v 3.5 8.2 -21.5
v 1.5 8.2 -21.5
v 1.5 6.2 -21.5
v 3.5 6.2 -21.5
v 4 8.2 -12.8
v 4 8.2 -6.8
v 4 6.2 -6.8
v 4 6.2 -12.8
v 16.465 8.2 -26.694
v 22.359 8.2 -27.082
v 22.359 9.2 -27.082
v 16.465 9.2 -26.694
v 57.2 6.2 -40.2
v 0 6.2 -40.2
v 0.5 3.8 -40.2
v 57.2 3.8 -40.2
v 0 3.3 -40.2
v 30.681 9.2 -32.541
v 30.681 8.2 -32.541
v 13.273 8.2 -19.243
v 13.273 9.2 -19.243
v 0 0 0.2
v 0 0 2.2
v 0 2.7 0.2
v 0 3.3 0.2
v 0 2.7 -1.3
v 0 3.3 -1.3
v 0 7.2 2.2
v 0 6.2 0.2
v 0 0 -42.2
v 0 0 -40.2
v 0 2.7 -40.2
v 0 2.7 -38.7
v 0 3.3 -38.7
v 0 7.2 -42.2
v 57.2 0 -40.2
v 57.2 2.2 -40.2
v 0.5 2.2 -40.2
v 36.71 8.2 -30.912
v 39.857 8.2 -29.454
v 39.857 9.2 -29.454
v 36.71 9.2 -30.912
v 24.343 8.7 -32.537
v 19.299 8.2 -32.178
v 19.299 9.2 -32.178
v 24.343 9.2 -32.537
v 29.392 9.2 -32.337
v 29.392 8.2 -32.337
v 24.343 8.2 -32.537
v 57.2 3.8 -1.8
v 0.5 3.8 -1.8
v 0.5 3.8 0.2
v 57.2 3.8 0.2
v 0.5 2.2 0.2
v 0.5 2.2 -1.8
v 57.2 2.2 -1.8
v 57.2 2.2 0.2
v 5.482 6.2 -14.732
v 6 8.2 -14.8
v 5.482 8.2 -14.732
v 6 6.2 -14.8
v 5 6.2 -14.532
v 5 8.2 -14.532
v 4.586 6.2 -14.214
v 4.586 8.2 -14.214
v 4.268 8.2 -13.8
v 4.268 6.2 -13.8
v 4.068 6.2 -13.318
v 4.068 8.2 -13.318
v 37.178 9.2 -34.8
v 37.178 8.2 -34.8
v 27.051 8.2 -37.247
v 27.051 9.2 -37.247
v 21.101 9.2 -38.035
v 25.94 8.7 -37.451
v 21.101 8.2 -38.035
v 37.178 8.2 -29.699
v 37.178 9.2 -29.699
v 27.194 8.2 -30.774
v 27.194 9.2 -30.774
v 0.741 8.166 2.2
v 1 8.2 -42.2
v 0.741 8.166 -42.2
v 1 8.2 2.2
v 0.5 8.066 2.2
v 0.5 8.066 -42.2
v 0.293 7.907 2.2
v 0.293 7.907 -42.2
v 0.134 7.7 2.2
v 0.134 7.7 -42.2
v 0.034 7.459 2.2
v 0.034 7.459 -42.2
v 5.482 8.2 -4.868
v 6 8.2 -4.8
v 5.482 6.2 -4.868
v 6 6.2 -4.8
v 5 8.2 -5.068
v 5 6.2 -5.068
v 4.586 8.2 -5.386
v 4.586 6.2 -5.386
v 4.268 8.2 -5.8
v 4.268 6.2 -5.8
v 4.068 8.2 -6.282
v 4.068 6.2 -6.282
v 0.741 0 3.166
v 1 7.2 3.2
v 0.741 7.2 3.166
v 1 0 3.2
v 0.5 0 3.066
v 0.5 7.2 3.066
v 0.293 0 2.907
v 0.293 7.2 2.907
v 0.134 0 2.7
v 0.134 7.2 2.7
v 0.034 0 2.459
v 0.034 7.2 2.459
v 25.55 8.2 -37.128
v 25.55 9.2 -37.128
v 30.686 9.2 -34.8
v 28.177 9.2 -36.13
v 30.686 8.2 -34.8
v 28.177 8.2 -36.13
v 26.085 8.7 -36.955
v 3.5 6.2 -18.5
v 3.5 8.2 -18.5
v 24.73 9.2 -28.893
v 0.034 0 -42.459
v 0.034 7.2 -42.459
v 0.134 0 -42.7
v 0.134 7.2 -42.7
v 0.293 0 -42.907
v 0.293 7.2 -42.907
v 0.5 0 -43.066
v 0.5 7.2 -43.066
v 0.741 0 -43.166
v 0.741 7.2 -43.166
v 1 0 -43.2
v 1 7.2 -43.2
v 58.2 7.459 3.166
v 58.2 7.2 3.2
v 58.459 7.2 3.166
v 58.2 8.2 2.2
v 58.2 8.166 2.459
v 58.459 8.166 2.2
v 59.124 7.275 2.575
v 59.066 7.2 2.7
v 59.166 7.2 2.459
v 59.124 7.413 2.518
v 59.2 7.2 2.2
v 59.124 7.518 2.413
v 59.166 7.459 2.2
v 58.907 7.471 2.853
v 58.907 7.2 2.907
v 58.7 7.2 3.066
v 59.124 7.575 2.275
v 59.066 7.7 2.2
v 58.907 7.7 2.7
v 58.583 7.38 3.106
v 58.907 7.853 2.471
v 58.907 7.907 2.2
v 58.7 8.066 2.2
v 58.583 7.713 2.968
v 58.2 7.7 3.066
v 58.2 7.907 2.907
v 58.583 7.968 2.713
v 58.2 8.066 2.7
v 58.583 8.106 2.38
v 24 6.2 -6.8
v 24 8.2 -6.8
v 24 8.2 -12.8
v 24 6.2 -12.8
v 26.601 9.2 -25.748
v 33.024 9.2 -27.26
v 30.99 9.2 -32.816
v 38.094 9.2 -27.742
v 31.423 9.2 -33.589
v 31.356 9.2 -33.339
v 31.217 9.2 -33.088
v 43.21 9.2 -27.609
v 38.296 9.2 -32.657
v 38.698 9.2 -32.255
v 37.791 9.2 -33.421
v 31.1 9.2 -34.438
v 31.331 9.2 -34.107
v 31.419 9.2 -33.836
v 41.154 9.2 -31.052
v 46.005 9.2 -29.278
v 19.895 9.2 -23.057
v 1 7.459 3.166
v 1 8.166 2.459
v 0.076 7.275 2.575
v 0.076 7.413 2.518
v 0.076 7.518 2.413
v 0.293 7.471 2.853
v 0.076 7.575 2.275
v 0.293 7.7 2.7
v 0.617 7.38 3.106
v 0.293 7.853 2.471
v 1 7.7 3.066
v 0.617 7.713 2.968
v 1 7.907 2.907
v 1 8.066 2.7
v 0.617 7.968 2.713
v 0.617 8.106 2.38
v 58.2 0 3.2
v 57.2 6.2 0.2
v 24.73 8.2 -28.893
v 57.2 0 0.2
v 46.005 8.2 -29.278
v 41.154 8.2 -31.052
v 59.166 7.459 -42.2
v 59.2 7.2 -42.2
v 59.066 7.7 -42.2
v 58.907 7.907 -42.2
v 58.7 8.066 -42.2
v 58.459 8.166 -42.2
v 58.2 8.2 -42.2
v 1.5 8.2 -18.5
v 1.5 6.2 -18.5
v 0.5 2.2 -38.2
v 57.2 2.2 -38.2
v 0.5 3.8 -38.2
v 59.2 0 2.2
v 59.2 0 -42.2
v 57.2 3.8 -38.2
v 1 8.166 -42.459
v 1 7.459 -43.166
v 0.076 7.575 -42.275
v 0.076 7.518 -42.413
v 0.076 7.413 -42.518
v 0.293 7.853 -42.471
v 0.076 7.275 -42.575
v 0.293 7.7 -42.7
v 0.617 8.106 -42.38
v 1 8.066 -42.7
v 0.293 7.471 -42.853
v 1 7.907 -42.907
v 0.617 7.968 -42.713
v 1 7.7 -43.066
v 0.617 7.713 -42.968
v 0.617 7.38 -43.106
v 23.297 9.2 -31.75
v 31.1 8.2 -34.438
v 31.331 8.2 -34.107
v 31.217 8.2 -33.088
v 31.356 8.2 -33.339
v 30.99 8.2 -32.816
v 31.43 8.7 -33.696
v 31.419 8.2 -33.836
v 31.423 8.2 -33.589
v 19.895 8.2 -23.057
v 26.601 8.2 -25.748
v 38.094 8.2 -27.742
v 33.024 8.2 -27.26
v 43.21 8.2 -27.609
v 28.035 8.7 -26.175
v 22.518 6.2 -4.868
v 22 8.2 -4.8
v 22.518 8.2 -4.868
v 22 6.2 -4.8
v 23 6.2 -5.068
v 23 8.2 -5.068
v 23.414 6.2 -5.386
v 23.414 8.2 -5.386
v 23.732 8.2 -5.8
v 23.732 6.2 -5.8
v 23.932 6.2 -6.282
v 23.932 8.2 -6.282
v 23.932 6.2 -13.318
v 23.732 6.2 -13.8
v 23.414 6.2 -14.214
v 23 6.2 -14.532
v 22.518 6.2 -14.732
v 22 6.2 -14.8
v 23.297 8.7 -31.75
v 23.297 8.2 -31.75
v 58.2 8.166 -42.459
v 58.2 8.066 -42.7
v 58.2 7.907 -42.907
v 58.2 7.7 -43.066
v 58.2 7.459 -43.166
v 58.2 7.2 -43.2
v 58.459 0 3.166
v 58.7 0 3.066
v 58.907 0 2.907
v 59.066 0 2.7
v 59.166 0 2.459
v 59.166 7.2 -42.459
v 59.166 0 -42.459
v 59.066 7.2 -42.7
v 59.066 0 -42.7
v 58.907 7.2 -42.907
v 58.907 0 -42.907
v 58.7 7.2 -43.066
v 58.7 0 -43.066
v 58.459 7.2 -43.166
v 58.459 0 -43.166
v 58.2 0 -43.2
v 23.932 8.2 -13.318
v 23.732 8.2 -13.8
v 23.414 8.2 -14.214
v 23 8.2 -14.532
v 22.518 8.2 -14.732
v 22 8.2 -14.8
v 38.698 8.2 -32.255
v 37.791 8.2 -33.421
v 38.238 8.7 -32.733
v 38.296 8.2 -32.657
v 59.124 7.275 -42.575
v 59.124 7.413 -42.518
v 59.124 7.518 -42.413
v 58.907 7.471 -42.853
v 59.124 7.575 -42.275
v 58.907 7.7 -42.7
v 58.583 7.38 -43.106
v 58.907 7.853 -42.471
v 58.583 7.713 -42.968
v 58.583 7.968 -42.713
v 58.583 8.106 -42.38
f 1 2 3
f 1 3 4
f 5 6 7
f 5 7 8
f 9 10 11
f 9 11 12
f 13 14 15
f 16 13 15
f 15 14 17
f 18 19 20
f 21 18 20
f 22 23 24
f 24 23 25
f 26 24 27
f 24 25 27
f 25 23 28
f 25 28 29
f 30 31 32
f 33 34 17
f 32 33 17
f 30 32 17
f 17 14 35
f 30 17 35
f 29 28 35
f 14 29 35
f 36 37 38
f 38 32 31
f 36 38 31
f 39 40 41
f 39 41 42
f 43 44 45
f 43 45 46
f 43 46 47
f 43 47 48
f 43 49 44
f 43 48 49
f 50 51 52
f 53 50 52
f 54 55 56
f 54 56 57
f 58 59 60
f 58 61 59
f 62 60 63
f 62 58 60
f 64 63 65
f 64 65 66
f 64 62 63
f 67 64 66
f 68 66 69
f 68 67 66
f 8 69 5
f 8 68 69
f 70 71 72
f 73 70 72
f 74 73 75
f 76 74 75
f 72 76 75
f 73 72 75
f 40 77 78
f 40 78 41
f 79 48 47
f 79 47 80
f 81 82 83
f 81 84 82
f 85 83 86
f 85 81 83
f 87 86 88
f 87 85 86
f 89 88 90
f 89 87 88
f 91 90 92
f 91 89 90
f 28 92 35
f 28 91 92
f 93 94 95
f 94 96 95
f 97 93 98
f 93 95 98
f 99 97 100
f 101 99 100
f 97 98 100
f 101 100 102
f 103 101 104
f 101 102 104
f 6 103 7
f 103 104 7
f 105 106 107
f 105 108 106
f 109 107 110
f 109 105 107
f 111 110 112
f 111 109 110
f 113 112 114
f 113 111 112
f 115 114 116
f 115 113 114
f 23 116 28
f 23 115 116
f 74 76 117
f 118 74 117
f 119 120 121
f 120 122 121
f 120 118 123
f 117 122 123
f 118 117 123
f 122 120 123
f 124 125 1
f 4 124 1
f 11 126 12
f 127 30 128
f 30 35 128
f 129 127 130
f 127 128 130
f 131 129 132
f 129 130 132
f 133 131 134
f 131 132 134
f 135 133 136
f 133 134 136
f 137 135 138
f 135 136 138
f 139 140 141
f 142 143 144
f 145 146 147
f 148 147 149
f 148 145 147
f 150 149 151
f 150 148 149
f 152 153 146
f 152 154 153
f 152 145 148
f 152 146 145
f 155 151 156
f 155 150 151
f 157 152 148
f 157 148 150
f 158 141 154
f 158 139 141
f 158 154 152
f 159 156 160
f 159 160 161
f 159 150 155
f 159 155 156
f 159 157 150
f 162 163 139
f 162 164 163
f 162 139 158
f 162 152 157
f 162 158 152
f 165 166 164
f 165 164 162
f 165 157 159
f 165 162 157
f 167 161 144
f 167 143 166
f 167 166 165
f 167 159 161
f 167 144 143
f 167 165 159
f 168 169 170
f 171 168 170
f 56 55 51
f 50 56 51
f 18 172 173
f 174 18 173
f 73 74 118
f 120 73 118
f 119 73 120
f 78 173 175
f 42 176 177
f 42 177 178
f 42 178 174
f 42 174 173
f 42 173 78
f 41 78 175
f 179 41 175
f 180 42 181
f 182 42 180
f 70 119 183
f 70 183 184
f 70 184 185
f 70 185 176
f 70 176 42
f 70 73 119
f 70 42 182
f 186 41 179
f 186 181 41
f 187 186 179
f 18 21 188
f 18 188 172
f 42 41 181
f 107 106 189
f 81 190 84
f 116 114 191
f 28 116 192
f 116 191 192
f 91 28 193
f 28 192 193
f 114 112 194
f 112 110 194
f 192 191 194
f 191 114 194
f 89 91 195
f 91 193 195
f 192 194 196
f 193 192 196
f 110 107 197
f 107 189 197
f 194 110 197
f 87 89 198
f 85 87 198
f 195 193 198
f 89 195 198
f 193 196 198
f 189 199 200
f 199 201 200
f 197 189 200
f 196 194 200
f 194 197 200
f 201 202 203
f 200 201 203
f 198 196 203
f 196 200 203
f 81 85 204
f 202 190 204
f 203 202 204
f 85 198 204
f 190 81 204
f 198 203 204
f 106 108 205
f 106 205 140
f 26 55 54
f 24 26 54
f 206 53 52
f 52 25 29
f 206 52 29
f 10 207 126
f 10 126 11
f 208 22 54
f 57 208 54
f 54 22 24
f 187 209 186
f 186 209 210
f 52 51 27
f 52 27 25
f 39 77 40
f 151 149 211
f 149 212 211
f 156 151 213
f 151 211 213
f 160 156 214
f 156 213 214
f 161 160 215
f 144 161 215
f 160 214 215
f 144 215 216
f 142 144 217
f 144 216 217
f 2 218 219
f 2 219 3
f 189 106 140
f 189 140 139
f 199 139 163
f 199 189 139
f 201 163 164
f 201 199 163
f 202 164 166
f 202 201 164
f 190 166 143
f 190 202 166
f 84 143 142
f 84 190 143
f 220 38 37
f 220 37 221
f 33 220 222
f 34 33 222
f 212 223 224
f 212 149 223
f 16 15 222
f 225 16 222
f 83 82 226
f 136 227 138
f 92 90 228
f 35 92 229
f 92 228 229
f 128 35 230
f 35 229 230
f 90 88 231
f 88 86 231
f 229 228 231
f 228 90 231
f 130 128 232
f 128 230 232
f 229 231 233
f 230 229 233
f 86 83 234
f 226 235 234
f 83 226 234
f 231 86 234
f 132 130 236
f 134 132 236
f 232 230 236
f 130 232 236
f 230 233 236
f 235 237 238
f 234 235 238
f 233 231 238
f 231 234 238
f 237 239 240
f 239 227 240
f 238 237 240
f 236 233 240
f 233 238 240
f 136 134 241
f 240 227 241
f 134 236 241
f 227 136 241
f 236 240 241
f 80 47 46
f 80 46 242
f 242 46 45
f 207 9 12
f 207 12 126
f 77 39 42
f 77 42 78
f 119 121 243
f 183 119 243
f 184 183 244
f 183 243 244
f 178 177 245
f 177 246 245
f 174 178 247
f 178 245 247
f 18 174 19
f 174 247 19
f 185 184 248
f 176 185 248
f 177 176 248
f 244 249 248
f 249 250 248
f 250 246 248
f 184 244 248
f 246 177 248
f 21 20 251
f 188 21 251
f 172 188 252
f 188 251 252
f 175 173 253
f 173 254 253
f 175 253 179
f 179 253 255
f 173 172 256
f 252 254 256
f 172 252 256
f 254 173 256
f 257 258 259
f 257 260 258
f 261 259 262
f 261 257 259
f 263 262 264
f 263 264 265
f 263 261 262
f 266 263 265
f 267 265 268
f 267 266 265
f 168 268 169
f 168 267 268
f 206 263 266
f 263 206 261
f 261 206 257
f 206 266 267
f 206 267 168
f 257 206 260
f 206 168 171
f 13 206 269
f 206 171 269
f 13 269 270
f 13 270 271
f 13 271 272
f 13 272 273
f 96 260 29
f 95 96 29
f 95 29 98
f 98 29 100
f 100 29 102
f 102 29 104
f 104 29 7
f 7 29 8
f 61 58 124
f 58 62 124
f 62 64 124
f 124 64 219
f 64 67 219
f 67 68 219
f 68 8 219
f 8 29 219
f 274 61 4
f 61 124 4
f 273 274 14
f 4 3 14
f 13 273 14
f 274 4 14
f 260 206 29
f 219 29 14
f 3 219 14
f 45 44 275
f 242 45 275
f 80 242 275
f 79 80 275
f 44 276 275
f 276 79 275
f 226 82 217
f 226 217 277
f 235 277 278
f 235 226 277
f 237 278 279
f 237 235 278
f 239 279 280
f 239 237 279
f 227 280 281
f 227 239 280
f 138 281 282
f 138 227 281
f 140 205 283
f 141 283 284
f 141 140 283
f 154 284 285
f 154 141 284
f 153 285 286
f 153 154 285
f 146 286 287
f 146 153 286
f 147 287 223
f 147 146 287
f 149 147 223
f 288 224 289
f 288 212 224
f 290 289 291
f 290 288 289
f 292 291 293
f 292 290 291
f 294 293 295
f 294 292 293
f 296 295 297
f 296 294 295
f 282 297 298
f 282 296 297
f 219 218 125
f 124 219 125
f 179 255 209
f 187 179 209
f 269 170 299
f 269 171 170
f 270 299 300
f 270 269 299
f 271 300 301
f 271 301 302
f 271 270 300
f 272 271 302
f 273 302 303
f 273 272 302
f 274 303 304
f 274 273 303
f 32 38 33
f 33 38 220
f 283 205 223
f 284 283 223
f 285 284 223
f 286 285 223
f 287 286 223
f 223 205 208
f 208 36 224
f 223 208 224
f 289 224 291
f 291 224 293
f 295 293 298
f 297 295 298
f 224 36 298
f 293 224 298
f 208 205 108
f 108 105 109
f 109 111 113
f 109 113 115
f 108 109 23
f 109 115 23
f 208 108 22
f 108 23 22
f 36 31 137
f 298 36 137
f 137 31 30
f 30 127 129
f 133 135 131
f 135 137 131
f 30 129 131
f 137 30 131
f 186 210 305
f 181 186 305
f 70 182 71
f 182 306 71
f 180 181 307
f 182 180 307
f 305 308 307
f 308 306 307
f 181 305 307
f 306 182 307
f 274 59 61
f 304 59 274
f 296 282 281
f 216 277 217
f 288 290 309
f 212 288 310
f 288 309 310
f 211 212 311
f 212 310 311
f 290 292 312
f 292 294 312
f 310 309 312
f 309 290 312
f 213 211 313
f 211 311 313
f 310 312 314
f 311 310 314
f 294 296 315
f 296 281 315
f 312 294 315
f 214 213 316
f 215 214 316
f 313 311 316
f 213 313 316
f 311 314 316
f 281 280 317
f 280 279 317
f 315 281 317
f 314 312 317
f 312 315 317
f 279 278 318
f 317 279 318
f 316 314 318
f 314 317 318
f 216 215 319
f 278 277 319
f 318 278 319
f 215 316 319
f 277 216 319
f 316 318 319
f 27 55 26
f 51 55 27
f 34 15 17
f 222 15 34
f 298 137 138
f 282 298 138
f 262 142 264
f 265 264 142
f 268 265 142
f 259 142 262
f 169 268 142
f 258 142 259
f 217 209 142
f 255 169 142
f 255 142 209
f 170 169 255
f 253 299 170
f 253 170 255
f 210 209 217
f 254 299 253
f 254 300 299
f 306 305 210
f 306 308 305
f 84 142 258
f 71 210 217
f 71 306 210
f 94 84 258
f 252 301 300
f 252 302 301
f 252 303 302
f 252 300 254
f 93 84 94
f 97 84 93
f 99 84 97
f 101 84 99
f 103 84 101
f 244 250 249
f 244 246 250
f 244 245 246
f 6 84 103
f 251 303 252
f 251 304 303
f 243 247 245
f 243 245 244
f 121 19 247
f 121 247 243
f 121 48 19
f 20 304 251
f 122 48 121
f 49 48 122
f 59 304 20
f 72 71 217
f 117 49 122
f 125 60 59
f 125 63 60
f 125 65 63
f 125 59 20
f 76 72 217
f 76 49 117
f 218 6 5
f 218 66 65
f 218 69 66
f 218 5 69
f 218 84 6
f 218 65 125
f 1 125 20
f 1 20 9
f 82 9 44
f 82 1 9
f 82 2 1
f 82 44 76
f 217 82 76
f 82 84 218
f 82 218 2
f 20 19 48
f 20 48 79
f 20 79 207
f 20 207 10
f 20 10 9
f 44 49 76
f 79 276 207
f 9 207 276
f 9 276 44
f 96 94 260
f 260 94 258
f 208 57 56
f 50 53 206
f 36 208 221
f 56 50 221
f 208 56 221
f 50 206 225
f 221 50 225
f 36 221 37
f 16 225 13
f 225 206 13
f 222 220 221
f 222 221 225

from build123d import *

# Parameters (mm, degrees)
EXTRUDE_1_DEPTH     = 57.2
SKETCH_2_W          = 2
SKETCH_2_H          = 1.6
EXTRUDE_2_DEPTH     = 57.2
CHAMFER_1_SIZE      = 0.5
SKETCH_3_W          = 46.4
SKETCH_3_H          = 8.2
EXTRUDE_3_DEPTH     = 2
SKETCH_4_W          = 20
SKETCH_4_H          = 10
CUT_EXTRUDE_1_DEPTH = 2
FILLET_1_R          = 1
FILLET_2_R          = 2
SKETCH_5_W          = 2
SKETCH_5_H          = 3
CUT_EXTRUDE_2_DEPTH = 2
EXTRUDE_4_DEPTH     = 1


with BuildPart() as part:
    # 草图1 → 凸台-拉伸1 (new body)
    with BuildSketch(Plane(origin=(0, 0, 0), x_dir=(0, 0, -1), z_dir=(1, 0, 0))):
        Polygon((-3.2, 0), (-0.2, 0), (-0.2, 6.2), (40.2, 6.2), (40.2, 0), (43.2, 0), (43.2, 8.2), (-3.2, 8.2), align=None)
    extrude(amount=EXTRUDE_1_DEPTH)

    # 草图2 → 凸台-拉伸2 (add)
    with BuildSketch(Plane.ZY):
        with Locations((-39.2, 3)):
            Rectangle(SKETCH_2_W, SKETCH_2_H)
        with Locations((-0.8, 3)):
            Rectangle(SKETCH_2_W, SKETCH_2_H)
    extrude(amount=-EXTRUDE_2_DEPTH)

    # 倒角1
    chamfer_1_edges = [part.edges().sort_by_distance(p)[0] for p in [
        (0, 2.2, -39.2),
        (0, 3, -38.2),
        (0, 3.8, -39.2),
        (0, 3.8, -0.8),
        (0, 3, -1.8),
        (0, 2.2, -0.8),
    ]]
    chamfer(chamfer_1_edges, length=CHAMFER_1_SIZE)

    # 草图3 → 凸台-拉伸3 (add)
    with BuildSketch(Plane(origin=(57.2, 0, 0), x_dir=(0, 0, -1), z_dir=(1, 0, 0))):
        with Locations((20, 4.1)):
            Rectangle(SKETCH_3_W, SKETCH_3_H)
    extrude(amount=EXTRUDE_3_DEPTH)

    # 草图4 → 切除-拉伸1 (cut)
    with BuildSketch(Plane(origin=(0, 8.2, 0), x_dir=(1, 0, 0), z_dir=(0, 1, 0))):
        with Locations((14, 9.8)):
            Rectangle(SKETCH_4_W, SKETCH_4_H)
    extrude(amount=-CUT_EXTRUDE_1_DEPTH, mode=Mode.SUBTRACT)

    # 圆角1
    fillet_1_edges = [part.edges().sort_by_distance(p)[0] for p in [
        (29.6, 8.2, 3.2),
        (29.6, 8.2, -43.2),
        (0, 4.1, 3.2),
        (0, 8.2, -20),
        (0, 4.1, -43.2),
        (59.2, 4.1, 3.2),
        (59.2, 4.1, -43.2),
        (59.2, 8.2, -20),
    ]]
    fillet(fillet_1_edges, radius=FILLET_1_R)

    # 圆角2
    fillet_2_edges = [part.edges().sort_by_distance(p)[0] for p in [
        (4, 7.2, -4.8),
        (4, 7.2, -14.8),
        (24, 7.2, -14.8),
        (24, 7.2, -4.8),
    ]]
    fillet(fillet_2_edges, radius=FILLET_2_R)

    # 草图5 → 切除-拉伸2 (cut)
    with BuildSketch(Plane(origin=(0, 8.2, 0), x_dir=(1, 0, 0), z_dir=(0, 1, 0))):
        with Locations((2.5, 20)):
            Rectangle(SKETCH_5_W, SKETCH_5_H)
    extrude(amount=-CUT_EXTRUDE_2_DEPTH, mode=Mode.SUBTRACT)

    # 草图6 → 凸台-拉伸4 (add)
    # profile 1 of 3: a face of its own
    with BuildSketch(Plane(origin=(0, 8.2, 0), x_dir=(1, 0, 0), z_dir=(0, 1, 0))):
        with BuildLine():
            Line((43.210238434, 27.609218662), (46.004565148, 29.278219616))
            Line((46.004565148, 29.278219616), (41.153736267, 31.052319712))
            add(Edge.make_bspline(
                [(41.153736267, 31.052319712), (38.917601784, 31.936798518), (38.081456616, 32.783594578), (37.429599552, 34.039752086), (37.178253479, 34.799893267)],
                knots=[0, 0, 0, 0, 0.258597765, 0.606503624, 0.606503624, 0.606503624, 0.606503624], degree=3))
            add(Edge.make_bspline(
                [(37.178253479, 34.799893267), (27.495556624, 37.127469308), (28.540823689, 37.034185208), (22.273471515, 38.064657168), (21.101157932, 38.034742746)],
                knots=[0, 0, 0, 0, 0.625762474, 1, 1, 1, 1], degree=3))
            add(Edge.make_bspline(
                [(21.101157932, 38.034742746), (26.275616415, 37.491858388), (30.685853804, 34.799893267)],
                knots=[0, 0, 0, 1, 1, 1], degree=2))
            add(Edge.make_bspline(
                [(30.685853804, 34.799893267), (32.176490653, 33.72226655), (30.681444749, 32.541026773)],
                knots=[0, 0, 0, 1, 1, 1], degree=2))
            Line((30.681444749, 32.541026773), (13.273453583, 19.243046464))
            add(Edge.make_bspline(
                [(13.273453583, 19.243046464), (27.82860145, 28.923958356), (43.210238434, 27.609218662)],
                knots=[0, 0, 0, 0.904008086, 0.904008086, 0.904008086], degree=2))
        make_face()
        Polygon((36.709764713, 30.912438237), (37.178253479, 29.699300691), (39.856659814, 29.454156879), align=None, mode=Mode.SUBTRACT)
    # profile 2 of 3: a face of its own
    with BuildSketch(Plane(origin=(0, 8.2, 0), x_dir=(1, 0, 0), z_dir=(0, 1, 0))):
        with BuildLine():
            Line((29.392459455, 32.336818489), (27.193702695, 30.773846816))
            add(Edge.make_bspline(
                [(19.299371197, 32.177872217), (23.346710302, 32.024077211), (27.193702695, 30.773846816)],
                knots=[0, 0, 0, 1, 1, 1], degree=2))
            add(Edge.make_bspline(
                [(19.299371197, 32.177872217), (24.339492566, 32.815798813), (29.392459455, 32.336818489)],
                knots=[0, 0, 0, 1, 1, 1], degree=2))
        make_face()
    # profile 3 of 3: a face of its own
    with BuildSketch(Plane(origin=(0, 8.2, 0), x_dir=(1, 0, 0), z_dir=(0, 1, 0))):
        Polygon((16.46482935, 26.694225841), (24.730035483, 28.8929826), (22.359389371, 27.082043876), align=None)
    extrude(amount=EXTRUDE_4_DEPTH)


solid = part.part
